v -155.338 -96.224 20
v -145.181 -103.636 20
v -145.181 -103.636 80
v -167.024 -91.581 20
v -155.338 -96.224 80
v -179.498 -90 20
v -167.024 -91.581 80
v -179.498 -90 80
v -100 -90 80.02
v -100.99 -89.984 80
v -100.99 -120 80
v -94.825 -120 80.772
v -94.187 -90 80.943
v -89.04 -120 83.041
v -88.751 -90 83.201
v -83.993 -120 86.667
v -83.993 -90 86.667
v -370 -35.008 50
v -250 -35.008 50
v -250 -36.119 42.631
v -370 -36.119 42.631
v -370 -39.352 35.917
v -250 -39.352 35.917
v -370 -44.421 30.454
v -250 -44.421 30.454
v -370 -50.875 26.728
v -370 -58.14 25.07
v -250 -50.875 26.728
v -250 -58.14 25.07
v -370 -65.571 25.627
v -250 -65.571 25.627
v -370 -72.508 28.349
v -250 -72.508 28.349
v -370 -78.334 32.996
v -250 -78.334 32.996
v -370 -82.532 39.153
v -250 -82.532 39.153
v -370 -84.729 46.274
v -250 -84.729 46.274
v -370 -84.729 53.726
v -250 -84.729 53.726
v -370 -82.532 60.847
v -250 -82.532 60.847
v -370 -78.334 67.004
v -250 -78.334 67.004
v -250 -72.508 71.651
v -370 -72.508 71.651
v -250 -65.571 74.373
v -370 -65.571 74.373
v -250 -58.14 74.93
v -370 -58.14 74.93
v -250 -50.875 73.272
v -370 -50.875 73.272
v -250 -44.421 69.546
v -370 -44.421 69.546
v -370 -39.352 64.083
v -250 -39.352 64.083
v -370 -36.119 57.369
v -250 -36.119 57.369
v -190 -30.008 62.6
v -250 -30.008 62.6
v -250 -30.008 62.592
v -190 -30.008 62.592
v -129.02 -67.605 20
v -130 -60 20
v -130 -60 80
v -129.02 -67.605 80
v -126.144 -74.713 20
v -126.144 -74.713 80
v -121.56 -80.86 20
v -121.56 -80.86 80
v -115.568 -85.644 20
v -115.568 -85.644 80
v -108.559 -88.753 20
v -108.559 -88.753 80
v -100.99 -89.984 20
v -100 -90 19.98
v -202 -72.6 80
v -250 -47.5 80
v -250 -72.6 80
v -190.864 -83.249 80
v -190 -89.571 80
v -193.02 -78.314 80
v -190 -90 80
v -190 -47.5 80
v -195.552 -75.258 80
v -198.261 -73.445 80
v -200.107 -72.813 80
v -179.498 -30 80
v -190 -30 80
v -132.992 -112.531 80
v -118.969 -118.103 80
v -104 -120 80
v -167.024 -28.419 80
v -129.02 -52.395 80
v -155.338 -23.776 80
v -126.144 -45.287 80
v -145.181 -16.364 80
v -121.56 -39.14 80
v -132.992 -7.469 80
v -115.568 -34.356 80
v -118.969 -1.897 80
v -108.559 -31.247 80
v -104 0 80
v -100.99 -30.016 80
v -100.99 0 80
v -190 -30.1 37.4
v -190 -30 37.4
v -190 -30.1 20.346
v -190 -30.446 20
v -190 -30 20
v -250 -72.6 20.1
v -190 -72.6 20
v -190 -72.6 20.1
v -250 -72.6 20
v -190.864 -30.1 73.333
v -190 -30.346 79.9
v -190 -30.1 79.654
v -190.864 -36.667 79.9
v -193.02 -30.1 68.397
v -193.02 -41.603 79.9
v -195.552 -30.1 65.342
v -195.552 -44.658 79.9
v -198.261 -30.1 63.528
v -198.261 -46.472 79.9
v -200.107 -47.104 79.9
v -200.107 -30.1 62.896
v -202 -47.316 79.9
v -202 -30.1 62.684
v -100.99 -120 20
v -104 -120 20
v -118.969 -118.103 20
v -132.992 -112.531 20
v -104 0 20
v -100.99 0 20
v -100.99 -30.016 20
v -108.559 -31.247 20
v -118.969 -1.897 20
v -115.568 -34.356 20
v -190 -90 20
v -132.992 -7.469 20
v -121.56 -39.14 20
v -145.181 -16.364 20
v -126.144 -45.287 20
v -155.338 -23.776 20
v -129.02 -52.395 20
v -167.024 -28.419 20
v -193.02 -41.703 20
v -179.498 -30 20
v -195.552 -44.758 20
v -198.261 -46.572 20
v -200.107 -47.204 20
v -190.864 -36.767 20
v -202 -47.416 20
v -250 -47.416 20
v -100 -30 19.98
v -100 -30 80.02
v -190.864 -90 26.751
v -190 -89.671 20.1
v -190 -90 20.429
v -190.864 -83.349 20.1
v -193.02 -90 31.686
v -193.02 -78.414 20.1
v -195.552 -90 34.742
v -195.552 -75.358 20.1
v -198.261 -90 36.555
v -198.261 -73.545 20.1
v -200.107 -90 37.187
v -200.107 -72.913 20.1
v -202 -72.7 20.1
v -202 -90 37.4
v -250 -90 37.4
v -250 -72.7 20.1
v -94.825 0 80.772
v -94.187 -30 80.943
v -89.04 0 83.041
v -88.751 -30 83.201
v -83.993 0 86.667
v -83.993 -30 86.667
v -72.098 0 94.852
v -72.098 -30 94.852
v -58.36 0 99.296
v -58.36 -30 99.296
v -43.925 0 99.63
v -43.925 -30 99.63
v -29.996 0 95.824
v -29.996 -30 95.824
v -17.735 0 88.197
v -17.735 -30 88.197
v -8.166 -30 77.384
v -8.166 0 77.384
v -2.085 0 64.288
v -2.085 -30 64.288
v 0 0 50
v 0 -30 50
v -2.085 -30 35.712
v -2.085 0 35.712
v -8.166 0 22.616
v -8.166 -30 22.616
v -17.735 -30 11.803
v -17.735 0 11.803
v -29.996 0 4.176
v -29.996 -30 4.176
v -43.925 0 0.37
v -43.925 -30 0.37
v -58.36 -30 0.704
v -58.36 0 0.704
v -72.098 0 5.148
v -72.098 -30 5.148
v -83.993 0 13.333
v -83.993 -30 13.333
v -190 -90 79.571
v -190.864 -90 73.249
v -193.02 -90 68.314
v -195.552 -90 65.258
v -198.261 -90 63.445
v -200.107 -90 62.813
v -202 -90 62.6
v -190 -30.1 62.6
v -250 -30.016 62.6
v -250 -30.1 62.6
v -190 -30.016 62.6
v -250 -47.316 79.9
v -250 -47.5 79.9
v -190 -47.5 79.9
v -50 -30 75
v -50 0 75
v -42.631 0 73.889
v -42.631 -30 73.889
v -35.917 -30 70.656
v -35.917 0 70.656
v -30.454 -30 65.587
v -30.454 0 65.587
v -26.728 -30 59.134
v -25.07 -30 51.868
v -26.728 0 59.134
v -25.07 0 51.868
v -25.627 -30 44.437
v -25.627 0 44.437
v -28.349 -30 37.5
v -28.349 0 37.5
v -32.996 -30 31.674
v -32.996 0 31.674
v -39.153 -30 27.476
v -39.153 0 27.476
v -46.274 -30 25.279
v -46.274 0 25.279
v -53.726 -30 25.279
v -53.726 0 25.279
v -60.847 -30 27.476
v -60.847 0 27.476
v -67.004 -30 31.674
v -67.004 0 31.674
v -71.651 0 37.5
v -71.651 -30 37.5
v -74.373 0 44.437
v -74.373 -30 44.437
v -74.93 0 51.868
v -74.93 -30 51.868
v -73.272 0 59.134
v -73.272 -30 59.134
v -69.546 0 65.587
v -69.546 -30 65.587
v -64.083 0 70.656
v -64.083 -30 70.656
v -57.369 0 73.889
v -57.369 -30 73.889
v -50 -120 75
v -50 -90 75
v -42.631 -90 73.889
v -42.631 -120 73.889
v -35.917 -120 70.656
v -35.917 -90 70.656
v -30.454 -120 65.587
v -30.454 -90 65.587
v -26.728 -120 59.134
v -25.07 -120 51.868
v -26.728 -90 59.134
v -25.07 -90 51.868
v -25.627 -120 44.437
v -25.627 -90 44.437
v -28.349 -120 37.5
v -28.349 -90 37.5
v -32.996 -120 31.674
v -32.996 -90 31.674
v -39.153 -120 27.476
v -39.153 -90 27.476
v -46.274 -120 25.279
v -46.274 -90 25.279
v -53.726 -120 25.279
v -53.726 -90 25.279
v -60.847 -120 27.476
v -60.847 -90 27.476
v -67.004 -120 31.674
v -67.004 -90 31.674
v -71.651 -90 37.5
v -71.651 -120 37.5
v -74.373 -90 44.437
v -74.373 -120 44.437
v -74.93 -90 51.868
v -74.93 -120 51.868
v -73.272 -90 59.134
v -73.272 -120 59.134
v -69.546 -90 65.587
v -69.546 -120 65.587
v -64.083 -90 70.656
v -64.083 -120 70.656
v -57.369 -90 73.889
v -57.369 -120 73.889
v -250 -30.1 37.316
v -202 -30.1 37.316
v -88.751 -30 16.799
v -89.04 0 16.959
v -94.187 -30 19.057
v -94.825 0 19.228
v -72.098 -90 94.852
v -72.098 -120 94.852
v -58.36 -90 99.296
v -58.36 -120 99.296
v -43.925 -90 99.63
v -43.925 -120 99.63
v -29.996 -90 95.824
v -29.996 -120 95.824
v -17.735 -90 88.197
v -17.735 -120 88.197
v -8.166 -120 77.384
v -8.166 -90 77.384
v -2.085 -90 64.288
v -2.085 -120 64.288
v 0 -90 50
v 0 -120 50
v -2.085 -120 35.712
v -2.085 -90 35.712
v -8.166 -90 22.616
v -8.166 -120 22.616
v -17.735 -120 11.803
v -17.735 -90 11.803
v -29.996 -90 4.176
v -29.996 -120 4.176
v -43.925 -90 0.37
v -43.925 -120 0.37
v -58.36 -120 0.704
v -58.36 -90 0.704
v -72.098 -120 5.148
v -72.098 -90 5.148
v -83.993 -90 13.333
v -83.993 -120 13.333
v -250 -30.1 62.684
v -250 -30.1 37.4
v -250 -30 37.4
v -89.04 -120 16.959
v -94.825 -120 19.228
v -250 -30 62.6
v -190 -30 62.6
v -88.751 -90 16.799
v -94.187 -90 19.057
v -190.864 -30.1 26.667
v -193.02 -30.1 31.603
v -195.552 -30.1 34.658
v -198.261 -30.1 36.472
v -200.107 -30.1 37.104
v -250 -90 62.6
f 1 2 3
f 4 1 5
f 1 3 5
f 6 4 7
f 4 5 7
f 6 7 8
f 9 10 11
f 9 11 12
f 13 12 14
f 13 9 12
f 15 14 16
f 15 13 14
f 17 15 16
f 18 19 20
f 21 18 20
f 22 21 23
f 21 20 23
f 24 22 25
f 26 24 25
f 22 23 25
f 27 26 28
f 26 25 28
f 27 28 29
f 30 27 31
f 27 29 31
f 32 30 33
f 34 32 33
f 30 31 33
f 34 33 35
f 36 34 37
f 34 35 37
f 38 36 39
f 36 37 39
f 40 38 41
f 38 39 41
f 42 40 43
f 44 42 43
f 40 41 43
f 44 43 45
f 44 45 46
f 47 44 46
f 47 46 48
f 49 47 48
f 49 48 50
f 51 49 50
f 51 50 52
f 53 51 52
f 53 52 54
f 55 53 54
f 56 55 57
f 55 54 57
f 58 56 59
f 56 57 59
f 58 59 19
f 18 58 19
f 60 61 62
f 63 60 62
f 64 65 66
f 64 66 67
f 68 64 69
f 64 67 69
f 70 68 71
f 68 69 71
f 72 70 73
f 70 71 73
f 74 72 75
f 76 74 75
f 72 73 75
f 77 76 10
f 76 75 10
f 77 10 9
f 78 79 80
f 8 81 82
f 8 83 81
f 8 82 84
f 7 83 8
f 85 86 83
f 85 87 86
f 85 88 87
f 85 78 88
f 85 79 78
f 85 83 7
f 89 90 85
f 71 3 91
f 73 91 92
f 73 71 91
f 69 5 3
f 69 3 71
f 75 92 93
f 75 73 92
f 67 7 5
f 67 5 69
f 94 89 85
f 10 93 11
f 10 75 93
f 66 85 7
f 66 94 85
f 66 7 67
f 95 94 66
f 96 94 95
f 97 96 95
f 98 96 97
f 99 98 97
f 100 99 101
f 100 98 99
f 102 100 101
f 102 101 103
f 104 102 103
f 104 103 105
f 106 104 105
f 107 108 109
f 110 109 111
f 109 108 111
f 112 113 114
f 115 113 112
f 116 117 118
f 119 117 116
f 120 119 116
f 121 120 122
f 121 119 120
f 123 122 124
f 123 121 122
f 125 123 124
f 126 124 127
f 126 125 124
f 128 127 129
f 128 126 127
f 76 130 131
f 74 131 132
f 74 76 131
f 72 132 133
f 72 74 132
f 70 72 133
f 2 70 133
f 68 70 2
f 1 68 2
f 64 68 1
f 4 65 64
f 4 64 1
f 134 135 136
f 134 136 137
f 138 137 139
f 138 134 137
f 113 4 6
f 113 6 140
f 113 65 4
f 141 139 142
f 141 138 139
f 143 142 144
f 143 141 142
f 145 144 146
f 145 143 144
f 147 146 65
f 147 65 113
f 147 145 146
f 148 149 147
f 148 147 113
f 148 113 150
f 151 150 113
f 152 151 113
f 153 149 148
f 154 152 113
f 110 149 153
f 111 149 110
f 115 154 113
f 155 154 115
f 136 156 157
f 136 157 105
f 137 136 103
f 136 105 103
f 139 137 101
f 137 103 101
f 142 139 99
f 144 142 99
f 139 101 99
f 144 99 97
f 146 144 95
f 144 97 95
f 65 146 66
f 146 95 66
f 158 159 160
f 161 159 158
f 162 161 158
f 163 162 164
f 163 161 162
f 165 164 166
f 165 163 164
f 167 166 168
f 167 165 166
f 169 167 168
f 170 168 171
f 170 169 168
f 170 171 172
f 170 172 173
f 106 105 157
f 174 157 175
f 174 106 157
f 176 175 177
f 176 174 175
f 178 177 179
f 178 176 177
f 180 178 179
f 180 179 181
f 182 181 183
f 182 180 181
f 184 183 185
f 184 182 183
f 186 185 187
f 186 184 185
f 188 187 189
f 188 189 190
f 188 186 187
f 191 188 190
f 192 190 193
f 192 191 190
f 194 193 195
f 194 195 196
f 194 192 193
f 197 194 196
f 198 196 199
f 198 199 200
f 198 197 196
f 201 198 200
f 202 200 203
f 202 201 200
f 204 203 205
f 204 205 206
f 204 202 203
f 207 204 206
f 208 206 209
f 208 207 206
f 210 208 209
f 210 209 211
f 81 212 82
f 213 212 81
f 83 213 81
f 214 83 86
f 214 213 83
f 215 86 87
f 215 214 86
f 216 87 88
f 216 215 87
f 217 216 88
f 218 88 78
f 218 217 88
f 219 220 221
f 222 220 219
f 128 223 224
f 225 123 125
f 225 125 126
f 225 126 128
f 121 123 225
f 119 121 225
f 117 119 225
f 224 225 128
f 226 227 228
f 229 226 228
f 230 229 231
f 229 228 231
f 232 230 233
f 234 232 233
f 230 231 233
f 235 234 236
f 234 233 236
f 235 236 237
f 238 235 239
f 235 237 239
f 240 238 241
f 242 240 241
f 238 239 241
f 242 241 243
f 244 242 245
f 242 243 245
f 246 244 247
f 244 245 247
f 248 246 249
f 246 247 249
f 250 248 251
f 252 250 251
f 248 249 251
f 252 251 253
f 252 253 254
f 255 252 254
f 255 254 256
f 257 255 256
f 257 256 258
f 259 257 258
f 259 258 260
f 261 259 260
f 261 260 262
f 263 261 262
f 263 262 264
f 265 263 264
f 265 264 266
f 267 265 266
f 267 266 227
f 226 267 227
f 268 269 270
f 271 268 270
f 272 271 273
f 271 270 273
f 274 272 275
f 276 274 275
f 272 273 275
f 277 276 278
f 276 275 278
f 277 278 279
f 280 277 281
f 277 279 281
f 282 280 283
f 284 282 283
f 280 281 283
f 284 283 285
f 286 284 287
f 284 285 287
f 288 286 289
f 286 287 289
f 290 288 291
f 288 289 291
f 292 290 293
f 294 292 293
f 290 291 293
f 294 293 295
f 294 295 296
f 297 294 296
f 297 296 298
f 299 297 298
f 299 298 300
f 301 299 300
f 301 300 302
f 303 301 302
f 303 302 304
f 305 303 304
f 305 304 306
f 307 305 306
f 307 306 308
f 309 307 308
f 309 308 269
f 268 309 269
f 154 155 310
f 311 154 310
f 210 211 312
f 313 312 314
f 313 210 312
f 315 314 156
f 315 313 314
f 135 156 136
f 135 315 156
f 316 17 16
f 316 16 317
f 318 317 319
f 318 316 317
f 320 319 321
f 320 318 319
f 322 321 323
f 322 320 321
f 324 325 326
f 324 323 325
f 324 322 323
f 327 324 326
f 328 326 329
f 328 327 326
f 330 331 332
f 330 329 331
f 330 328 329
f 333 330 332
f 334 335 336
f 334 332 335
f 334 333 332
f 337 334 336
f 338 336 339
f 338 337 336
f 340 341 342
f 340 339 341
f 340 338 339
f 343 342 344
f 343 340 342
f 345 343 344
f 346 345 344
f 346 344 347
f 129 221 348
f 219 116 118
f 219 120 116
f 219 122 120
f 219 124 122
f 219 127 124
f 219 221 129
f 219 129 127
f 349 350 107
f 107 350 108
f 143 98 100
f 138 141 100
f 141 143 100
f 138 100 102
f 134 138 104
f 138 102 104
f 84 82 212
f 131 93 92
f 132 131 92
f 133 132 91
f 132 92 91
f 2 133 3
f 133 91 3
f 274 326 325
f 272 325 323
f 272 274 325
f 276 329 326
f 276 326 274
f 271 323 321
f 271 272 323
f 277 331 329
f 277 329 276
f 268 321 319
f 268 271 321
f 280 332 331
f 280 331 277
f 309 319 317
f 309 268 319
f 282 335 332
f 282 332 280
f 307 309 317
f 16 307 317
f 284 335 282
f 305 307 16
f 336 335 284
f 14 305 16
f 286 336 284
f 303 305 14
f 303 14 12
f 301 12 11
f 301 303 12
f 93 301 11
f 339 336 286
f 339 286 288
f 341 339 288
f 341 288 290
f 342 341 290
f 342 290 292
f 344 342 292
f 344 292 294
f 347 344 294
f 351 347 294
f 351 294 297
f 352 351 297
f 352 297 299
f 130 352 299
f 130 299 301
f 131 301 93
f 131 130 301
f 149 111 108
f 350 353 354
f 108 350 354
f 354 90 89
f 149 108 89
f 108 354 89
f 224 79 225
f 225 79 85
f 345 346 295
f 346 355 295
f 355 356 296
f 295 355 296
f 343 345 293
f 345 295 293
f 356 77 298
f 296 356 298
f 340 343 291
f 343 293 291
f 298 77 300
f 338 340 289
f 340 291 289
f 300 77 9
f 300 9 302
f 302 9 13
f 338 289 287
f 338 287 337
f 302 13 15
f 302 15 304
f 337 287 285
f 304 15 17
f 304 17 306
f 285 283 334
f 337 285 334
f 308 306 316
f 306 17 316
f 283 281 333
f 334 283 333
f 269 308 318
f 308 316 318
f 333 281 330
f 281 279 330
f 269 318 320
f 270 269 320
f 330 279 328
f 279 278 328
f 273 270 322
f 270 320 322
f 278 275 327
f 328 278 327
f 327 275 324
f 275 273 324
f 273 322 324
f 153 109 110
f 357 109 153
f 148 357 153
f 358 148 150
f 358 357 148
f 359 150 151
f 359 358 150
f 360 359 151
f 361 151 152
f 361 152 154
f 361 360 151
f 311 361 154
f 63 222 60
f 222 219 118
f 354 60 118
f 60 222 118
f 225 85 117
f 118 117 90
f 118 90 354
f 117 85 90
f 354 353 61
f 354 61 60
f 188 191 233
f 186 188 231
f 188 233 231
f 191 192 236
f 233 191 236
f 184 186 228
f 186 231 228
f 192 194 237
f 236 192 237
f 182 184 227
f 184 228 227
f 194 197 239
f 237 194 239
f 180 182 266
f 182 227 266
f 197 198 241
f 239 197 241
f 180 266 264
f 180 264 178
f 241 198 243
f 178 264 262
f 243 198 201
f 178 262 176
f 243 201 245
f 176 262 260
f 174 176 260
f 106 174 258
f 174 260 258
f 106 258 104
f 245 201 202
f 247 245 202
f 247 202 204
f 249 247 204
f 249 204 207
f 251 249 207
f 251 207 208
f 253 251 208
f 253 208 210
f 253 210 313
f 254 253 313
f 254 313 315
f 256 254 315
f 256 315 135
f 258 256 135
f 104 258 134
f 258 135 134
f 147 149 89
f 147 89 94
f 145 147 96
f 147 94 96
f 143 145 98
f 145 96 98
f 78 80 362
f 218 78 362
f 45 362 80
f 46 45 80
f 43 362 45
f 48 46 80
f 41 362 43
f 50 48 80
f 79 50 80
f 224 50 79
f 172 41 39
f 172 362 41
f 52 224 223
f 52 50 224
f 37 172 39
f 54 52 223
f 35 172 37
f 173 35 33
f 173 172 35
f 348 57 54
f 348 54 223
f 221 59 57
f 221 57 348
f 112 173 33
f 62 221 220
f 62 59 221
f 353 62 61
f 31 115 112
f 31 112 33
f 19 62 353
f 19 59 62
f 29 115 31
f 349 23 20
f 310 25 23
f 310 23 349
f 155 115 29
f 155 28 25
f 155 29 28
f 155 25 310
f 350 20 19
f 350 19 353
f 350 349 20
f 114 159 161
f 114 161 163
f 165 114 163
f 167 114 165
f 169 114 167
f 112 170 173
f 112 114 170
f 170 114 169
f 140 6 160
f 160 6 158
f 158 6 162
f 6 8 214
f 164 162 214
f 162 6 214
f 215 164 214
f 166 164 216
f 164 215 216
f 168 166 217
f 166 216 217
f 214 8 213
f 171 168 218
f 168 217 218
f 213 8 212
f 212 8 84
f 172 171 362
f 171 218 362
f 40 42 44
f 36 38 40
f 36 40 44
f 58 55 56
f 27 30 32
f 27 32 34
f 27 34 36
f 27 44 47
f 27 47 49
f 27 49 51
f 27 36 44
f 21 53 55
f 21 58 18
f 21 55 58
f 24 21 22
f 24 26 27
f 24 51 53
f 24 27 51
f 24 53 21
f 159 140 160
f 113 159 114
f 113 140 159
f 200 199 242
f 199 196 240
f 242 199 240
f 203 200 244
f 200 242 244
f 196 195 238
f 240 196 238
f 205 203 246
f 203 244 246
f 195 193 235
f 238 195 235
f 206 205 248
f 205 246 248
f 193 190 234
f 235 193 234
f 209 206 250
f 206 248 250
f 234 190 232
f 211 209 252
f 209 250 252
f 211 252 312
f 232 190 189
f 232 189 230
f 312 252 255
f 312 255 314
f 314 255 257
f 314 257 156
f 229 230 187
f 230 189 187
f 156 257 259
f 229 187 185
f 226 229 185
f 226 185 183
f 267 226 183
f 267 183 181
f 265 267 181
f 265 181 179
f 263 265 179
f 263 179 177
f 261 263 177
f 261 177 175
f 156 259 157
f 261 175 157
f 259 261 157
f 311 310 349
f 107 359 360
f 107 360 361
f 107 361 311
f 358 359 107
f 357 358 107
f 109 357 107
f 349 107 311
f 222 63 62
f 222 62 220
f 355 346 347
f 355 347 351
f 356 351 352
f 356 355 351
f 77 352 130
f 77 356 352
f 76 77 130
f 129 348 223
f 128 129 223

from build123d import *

# Parameters (mm, degrees)
SKETCH2_W           = 120
SKETCH2_H           = 250
BOSS_EXTRUDE1_DEPTH = 100
CUT_EXTRUDE1_DEPTH  = 295.78805946
SKETCH4_OUTSIDE_W   = 310.958
SKETCH4_OUTSIDE_H   = 160.958
SKETCH4_OUTSIDE_R   = 25
CUT_EXTRUDE2_DEPTH  = 295.78805946
CUT_EXTRUDE6_DEPTH  = 60
SKETCH5_4_R         = 25
BOSS_EXTRUDE3_DEPTH = 120
SKETCH6_W           = 60
SKETCH6_H           = 17.4
CUT_EXTRUDE7_DEPTH  = 0.1
SKETCH7_W           = 60
SKETCH7_H           = 17.4
CUT_EXTRUDE8_DEPTH  = 0.1
SKETCH8_W           = 60
SKETCH8_H           = 17.4
CUT_EXTRUDE9_DEPTH  = 0.1
FILLET5_R           = 12
FILLET6_R           = 12


with BuildPart() as part:
    # Sketch2 → Boss-Extrude1 (new body)
    with BuildSketch(Plane(origin=(0, 0, 0), x_dir=(0, 1, 0), z_dir=(0, 0, 1))):
        with Locations((-60, 125)):
            Rectangle(SKETCH2_W, SKETCH2_H)
    extrude(amount=BOSS_EXTRUDE1_DEPTH)

    # Sketch3 → Cut-Extrude1 (cut, through all)
    with BuildSketch(Plane.XY.offset(100)):
        with BuildLine():
            ThreePointArc((-100, -30), (-130, -60), (-100, -90))
            Line((-100, -90), (0, -90))
            Line((0, -90), (0, -30))
            Line((0, -30), (-100, -30))
        make_face()
        with BuildLine():
            Line((-250, 0), (-250, -30))
            Line((-250, -30), (-179.498344353, -30))
            ThreePointArc((-179.498344353, -30), (-161.034620706, -26.466018864), (-145.180915101, -16.363636364))
            ThreePointArc((-145.180915101, -16.363636364), (-126.156468376, -4.240777363), (-104, 0))
            Line((-104, 0), (-250, 0))
        make_face()
        with BuildLine():
            Line((-179.498344353, -90), (-250, -90))
            Line((-250, -90), (-250, -120))
            Line((-250, -120), (-103.999999784, -120))
            ThreePointArc((-103.999999784, -120), (-126.156468276, -115.759222677), (-145.180915101, -103.636363636))
            ThreePointArc((-145.180915101, -103.636363636), (-161.034620706, -93.533981136), (-179.498344353, -90))
        make_face()
    extrude(amount=-CUT_EXTRUDE1_DEPTH, mode=Mode.SUBTRACT)

    # Sketch4 outside → Cut-Extrude2 (cut, through all)
    # profile 1 of 2: a face of its own
    with BuildSketch(Plane(origin=(0, 0, 0), x_dir=(-1, 0, 0), z_dir=(0, 1, 0))):
        with Locations((125, 50)):
            Rectangle(SKETCH4_OUTSIDE_W, SKETCH4_OUTSIDE_H)
        with BuildLine():
            Line((250, 80), (100.990195136, 80))
            ThreePointArc((100.990195136, 80), (91.861485844, 81.726266594), (83.993463424, 86.666666667))
            ThreePointArc((83.993463424, 86.666666667), (0, 50), (83.993463424, 13.333333333))
            ThreePointArc((83.993463424, 13.333333333), (91.861485844, 18.273733406), (100.990195136, 20))
            Line((100.990195136, 20), (250, 20))
            Line((250, 20), (250, 80))
        make_face(mode=Mode.SUBTRACT)
    # profile 2 of 2: a face of its own
    with BuildSketch(Plane(origin=(0, 0, 0), x_dir=(-1, 0, 0), z_dir=(0, 1, 0))):
        with Locations((50, 50)):
            Circle(SKETCH4_OUTSIDE_R)
    extrude(amount=-CUT_EXTRUDE2_DEPTH, mode=Mode.SUBTRACT)

    # Sketch5 → Cut-Extrude6 (cut)
    with BuildSketch(Plane(origin=(-250, 0, 0), x_dir=(0, -1, 0), z_dir=(-1, 0, 0))):
        Polygon((72.6, 80), (90, 62.6), (90, 80), align=None)
        Polygon((72.608172947, 20.008172947), (90.008172947, 20.008172947), (90.008172947, 37.408172947), align=None)
        Polygon((30.016345893, 37.4), (30.016345893, 20), (47.416345893, 20), align=None)
        Polygon((47.408172947, 79.991827053), (30.008172947, 79.991827053), (30.008172947, 62.591827053), align=None)
    extrude(amount=-CUT_EXTRUDE6_DEPTH, mode=Mode.SUBTRACT)

    # Sketch5<4> → Boss-Extrude3 (add)
    with BuildSketch(Plane(origin=(-250, 0, 0), x_dir=(0, -1, 0), z_dir=(-1, 0, 0))):
        with Locations((60.008172947, 50)):
            Circle(SKETCH5_4_R)
    extrude(amount=BOSS_EXTRUDE3_DEPTH)

    # Sketch6 → Cut-Extrude7 (cut)
    with BuildSketch(Plane(origin=(0, -30, 0), x_dir=(1, 0, 0), z_dir=(0, 1, 0))):
        with Locations((-220, -71.3)):
            Rectangle(SKETCH6_W, SKETCH6_H)
        with Locations((-220, -28.7)):
            Rectangle(SKETCH6_W, SKETCH6_H)
    extrude(amount=-CUT_EXTRUDE7_DEPTH, mode=Mode.SUBTRACT)

    # Sketch7 → Cut-Extrude8 (cut)
    with BuildSketch(Plane(origin=(0, 0, 20), x_dir=(-1, 0, 0), z_dir=(0, 0, -1))):
        with Locations((220, -81.3)):
            Rectangle(SKETCH7_W, SKETCH7_H)
    extrude(amount=-CUT_EXTRUDE8_DEPTH, mode=Mode.SUBTRACT)

    # Sketch8 → Cut-Extrude9 (cut)
    with BuildSketch(Plane.XY.offset(80)):
        with Locations((-220, -38.8)):
            Rectangle(SKETCH8_W, SKETCH8_H)
    extrude(amount=-CUT_EXTRUDE9_DEPTH, mode=Mode.SUBTRACT)

    # Fillet5
    fillet5_edges = [part.edges().sort_by_distance(p)[0] for p in [
        (-190, -38.708172947, 71.291827053),
    ]]
    fillet(fillet5_edges, radius=FILLET5_R)

    # Fillet6
    fillet6_edges = [part.edges().sort_by_distance(p)[0] for p in [
        (-190, -81.3, 71.3),
        (-190, -81.35, 28.75),
        (-190, -38.758172947, 28.658172947),
    ]]
    fillet(fillet6_edges, radius=FILLET6_R)


solid = part.part
